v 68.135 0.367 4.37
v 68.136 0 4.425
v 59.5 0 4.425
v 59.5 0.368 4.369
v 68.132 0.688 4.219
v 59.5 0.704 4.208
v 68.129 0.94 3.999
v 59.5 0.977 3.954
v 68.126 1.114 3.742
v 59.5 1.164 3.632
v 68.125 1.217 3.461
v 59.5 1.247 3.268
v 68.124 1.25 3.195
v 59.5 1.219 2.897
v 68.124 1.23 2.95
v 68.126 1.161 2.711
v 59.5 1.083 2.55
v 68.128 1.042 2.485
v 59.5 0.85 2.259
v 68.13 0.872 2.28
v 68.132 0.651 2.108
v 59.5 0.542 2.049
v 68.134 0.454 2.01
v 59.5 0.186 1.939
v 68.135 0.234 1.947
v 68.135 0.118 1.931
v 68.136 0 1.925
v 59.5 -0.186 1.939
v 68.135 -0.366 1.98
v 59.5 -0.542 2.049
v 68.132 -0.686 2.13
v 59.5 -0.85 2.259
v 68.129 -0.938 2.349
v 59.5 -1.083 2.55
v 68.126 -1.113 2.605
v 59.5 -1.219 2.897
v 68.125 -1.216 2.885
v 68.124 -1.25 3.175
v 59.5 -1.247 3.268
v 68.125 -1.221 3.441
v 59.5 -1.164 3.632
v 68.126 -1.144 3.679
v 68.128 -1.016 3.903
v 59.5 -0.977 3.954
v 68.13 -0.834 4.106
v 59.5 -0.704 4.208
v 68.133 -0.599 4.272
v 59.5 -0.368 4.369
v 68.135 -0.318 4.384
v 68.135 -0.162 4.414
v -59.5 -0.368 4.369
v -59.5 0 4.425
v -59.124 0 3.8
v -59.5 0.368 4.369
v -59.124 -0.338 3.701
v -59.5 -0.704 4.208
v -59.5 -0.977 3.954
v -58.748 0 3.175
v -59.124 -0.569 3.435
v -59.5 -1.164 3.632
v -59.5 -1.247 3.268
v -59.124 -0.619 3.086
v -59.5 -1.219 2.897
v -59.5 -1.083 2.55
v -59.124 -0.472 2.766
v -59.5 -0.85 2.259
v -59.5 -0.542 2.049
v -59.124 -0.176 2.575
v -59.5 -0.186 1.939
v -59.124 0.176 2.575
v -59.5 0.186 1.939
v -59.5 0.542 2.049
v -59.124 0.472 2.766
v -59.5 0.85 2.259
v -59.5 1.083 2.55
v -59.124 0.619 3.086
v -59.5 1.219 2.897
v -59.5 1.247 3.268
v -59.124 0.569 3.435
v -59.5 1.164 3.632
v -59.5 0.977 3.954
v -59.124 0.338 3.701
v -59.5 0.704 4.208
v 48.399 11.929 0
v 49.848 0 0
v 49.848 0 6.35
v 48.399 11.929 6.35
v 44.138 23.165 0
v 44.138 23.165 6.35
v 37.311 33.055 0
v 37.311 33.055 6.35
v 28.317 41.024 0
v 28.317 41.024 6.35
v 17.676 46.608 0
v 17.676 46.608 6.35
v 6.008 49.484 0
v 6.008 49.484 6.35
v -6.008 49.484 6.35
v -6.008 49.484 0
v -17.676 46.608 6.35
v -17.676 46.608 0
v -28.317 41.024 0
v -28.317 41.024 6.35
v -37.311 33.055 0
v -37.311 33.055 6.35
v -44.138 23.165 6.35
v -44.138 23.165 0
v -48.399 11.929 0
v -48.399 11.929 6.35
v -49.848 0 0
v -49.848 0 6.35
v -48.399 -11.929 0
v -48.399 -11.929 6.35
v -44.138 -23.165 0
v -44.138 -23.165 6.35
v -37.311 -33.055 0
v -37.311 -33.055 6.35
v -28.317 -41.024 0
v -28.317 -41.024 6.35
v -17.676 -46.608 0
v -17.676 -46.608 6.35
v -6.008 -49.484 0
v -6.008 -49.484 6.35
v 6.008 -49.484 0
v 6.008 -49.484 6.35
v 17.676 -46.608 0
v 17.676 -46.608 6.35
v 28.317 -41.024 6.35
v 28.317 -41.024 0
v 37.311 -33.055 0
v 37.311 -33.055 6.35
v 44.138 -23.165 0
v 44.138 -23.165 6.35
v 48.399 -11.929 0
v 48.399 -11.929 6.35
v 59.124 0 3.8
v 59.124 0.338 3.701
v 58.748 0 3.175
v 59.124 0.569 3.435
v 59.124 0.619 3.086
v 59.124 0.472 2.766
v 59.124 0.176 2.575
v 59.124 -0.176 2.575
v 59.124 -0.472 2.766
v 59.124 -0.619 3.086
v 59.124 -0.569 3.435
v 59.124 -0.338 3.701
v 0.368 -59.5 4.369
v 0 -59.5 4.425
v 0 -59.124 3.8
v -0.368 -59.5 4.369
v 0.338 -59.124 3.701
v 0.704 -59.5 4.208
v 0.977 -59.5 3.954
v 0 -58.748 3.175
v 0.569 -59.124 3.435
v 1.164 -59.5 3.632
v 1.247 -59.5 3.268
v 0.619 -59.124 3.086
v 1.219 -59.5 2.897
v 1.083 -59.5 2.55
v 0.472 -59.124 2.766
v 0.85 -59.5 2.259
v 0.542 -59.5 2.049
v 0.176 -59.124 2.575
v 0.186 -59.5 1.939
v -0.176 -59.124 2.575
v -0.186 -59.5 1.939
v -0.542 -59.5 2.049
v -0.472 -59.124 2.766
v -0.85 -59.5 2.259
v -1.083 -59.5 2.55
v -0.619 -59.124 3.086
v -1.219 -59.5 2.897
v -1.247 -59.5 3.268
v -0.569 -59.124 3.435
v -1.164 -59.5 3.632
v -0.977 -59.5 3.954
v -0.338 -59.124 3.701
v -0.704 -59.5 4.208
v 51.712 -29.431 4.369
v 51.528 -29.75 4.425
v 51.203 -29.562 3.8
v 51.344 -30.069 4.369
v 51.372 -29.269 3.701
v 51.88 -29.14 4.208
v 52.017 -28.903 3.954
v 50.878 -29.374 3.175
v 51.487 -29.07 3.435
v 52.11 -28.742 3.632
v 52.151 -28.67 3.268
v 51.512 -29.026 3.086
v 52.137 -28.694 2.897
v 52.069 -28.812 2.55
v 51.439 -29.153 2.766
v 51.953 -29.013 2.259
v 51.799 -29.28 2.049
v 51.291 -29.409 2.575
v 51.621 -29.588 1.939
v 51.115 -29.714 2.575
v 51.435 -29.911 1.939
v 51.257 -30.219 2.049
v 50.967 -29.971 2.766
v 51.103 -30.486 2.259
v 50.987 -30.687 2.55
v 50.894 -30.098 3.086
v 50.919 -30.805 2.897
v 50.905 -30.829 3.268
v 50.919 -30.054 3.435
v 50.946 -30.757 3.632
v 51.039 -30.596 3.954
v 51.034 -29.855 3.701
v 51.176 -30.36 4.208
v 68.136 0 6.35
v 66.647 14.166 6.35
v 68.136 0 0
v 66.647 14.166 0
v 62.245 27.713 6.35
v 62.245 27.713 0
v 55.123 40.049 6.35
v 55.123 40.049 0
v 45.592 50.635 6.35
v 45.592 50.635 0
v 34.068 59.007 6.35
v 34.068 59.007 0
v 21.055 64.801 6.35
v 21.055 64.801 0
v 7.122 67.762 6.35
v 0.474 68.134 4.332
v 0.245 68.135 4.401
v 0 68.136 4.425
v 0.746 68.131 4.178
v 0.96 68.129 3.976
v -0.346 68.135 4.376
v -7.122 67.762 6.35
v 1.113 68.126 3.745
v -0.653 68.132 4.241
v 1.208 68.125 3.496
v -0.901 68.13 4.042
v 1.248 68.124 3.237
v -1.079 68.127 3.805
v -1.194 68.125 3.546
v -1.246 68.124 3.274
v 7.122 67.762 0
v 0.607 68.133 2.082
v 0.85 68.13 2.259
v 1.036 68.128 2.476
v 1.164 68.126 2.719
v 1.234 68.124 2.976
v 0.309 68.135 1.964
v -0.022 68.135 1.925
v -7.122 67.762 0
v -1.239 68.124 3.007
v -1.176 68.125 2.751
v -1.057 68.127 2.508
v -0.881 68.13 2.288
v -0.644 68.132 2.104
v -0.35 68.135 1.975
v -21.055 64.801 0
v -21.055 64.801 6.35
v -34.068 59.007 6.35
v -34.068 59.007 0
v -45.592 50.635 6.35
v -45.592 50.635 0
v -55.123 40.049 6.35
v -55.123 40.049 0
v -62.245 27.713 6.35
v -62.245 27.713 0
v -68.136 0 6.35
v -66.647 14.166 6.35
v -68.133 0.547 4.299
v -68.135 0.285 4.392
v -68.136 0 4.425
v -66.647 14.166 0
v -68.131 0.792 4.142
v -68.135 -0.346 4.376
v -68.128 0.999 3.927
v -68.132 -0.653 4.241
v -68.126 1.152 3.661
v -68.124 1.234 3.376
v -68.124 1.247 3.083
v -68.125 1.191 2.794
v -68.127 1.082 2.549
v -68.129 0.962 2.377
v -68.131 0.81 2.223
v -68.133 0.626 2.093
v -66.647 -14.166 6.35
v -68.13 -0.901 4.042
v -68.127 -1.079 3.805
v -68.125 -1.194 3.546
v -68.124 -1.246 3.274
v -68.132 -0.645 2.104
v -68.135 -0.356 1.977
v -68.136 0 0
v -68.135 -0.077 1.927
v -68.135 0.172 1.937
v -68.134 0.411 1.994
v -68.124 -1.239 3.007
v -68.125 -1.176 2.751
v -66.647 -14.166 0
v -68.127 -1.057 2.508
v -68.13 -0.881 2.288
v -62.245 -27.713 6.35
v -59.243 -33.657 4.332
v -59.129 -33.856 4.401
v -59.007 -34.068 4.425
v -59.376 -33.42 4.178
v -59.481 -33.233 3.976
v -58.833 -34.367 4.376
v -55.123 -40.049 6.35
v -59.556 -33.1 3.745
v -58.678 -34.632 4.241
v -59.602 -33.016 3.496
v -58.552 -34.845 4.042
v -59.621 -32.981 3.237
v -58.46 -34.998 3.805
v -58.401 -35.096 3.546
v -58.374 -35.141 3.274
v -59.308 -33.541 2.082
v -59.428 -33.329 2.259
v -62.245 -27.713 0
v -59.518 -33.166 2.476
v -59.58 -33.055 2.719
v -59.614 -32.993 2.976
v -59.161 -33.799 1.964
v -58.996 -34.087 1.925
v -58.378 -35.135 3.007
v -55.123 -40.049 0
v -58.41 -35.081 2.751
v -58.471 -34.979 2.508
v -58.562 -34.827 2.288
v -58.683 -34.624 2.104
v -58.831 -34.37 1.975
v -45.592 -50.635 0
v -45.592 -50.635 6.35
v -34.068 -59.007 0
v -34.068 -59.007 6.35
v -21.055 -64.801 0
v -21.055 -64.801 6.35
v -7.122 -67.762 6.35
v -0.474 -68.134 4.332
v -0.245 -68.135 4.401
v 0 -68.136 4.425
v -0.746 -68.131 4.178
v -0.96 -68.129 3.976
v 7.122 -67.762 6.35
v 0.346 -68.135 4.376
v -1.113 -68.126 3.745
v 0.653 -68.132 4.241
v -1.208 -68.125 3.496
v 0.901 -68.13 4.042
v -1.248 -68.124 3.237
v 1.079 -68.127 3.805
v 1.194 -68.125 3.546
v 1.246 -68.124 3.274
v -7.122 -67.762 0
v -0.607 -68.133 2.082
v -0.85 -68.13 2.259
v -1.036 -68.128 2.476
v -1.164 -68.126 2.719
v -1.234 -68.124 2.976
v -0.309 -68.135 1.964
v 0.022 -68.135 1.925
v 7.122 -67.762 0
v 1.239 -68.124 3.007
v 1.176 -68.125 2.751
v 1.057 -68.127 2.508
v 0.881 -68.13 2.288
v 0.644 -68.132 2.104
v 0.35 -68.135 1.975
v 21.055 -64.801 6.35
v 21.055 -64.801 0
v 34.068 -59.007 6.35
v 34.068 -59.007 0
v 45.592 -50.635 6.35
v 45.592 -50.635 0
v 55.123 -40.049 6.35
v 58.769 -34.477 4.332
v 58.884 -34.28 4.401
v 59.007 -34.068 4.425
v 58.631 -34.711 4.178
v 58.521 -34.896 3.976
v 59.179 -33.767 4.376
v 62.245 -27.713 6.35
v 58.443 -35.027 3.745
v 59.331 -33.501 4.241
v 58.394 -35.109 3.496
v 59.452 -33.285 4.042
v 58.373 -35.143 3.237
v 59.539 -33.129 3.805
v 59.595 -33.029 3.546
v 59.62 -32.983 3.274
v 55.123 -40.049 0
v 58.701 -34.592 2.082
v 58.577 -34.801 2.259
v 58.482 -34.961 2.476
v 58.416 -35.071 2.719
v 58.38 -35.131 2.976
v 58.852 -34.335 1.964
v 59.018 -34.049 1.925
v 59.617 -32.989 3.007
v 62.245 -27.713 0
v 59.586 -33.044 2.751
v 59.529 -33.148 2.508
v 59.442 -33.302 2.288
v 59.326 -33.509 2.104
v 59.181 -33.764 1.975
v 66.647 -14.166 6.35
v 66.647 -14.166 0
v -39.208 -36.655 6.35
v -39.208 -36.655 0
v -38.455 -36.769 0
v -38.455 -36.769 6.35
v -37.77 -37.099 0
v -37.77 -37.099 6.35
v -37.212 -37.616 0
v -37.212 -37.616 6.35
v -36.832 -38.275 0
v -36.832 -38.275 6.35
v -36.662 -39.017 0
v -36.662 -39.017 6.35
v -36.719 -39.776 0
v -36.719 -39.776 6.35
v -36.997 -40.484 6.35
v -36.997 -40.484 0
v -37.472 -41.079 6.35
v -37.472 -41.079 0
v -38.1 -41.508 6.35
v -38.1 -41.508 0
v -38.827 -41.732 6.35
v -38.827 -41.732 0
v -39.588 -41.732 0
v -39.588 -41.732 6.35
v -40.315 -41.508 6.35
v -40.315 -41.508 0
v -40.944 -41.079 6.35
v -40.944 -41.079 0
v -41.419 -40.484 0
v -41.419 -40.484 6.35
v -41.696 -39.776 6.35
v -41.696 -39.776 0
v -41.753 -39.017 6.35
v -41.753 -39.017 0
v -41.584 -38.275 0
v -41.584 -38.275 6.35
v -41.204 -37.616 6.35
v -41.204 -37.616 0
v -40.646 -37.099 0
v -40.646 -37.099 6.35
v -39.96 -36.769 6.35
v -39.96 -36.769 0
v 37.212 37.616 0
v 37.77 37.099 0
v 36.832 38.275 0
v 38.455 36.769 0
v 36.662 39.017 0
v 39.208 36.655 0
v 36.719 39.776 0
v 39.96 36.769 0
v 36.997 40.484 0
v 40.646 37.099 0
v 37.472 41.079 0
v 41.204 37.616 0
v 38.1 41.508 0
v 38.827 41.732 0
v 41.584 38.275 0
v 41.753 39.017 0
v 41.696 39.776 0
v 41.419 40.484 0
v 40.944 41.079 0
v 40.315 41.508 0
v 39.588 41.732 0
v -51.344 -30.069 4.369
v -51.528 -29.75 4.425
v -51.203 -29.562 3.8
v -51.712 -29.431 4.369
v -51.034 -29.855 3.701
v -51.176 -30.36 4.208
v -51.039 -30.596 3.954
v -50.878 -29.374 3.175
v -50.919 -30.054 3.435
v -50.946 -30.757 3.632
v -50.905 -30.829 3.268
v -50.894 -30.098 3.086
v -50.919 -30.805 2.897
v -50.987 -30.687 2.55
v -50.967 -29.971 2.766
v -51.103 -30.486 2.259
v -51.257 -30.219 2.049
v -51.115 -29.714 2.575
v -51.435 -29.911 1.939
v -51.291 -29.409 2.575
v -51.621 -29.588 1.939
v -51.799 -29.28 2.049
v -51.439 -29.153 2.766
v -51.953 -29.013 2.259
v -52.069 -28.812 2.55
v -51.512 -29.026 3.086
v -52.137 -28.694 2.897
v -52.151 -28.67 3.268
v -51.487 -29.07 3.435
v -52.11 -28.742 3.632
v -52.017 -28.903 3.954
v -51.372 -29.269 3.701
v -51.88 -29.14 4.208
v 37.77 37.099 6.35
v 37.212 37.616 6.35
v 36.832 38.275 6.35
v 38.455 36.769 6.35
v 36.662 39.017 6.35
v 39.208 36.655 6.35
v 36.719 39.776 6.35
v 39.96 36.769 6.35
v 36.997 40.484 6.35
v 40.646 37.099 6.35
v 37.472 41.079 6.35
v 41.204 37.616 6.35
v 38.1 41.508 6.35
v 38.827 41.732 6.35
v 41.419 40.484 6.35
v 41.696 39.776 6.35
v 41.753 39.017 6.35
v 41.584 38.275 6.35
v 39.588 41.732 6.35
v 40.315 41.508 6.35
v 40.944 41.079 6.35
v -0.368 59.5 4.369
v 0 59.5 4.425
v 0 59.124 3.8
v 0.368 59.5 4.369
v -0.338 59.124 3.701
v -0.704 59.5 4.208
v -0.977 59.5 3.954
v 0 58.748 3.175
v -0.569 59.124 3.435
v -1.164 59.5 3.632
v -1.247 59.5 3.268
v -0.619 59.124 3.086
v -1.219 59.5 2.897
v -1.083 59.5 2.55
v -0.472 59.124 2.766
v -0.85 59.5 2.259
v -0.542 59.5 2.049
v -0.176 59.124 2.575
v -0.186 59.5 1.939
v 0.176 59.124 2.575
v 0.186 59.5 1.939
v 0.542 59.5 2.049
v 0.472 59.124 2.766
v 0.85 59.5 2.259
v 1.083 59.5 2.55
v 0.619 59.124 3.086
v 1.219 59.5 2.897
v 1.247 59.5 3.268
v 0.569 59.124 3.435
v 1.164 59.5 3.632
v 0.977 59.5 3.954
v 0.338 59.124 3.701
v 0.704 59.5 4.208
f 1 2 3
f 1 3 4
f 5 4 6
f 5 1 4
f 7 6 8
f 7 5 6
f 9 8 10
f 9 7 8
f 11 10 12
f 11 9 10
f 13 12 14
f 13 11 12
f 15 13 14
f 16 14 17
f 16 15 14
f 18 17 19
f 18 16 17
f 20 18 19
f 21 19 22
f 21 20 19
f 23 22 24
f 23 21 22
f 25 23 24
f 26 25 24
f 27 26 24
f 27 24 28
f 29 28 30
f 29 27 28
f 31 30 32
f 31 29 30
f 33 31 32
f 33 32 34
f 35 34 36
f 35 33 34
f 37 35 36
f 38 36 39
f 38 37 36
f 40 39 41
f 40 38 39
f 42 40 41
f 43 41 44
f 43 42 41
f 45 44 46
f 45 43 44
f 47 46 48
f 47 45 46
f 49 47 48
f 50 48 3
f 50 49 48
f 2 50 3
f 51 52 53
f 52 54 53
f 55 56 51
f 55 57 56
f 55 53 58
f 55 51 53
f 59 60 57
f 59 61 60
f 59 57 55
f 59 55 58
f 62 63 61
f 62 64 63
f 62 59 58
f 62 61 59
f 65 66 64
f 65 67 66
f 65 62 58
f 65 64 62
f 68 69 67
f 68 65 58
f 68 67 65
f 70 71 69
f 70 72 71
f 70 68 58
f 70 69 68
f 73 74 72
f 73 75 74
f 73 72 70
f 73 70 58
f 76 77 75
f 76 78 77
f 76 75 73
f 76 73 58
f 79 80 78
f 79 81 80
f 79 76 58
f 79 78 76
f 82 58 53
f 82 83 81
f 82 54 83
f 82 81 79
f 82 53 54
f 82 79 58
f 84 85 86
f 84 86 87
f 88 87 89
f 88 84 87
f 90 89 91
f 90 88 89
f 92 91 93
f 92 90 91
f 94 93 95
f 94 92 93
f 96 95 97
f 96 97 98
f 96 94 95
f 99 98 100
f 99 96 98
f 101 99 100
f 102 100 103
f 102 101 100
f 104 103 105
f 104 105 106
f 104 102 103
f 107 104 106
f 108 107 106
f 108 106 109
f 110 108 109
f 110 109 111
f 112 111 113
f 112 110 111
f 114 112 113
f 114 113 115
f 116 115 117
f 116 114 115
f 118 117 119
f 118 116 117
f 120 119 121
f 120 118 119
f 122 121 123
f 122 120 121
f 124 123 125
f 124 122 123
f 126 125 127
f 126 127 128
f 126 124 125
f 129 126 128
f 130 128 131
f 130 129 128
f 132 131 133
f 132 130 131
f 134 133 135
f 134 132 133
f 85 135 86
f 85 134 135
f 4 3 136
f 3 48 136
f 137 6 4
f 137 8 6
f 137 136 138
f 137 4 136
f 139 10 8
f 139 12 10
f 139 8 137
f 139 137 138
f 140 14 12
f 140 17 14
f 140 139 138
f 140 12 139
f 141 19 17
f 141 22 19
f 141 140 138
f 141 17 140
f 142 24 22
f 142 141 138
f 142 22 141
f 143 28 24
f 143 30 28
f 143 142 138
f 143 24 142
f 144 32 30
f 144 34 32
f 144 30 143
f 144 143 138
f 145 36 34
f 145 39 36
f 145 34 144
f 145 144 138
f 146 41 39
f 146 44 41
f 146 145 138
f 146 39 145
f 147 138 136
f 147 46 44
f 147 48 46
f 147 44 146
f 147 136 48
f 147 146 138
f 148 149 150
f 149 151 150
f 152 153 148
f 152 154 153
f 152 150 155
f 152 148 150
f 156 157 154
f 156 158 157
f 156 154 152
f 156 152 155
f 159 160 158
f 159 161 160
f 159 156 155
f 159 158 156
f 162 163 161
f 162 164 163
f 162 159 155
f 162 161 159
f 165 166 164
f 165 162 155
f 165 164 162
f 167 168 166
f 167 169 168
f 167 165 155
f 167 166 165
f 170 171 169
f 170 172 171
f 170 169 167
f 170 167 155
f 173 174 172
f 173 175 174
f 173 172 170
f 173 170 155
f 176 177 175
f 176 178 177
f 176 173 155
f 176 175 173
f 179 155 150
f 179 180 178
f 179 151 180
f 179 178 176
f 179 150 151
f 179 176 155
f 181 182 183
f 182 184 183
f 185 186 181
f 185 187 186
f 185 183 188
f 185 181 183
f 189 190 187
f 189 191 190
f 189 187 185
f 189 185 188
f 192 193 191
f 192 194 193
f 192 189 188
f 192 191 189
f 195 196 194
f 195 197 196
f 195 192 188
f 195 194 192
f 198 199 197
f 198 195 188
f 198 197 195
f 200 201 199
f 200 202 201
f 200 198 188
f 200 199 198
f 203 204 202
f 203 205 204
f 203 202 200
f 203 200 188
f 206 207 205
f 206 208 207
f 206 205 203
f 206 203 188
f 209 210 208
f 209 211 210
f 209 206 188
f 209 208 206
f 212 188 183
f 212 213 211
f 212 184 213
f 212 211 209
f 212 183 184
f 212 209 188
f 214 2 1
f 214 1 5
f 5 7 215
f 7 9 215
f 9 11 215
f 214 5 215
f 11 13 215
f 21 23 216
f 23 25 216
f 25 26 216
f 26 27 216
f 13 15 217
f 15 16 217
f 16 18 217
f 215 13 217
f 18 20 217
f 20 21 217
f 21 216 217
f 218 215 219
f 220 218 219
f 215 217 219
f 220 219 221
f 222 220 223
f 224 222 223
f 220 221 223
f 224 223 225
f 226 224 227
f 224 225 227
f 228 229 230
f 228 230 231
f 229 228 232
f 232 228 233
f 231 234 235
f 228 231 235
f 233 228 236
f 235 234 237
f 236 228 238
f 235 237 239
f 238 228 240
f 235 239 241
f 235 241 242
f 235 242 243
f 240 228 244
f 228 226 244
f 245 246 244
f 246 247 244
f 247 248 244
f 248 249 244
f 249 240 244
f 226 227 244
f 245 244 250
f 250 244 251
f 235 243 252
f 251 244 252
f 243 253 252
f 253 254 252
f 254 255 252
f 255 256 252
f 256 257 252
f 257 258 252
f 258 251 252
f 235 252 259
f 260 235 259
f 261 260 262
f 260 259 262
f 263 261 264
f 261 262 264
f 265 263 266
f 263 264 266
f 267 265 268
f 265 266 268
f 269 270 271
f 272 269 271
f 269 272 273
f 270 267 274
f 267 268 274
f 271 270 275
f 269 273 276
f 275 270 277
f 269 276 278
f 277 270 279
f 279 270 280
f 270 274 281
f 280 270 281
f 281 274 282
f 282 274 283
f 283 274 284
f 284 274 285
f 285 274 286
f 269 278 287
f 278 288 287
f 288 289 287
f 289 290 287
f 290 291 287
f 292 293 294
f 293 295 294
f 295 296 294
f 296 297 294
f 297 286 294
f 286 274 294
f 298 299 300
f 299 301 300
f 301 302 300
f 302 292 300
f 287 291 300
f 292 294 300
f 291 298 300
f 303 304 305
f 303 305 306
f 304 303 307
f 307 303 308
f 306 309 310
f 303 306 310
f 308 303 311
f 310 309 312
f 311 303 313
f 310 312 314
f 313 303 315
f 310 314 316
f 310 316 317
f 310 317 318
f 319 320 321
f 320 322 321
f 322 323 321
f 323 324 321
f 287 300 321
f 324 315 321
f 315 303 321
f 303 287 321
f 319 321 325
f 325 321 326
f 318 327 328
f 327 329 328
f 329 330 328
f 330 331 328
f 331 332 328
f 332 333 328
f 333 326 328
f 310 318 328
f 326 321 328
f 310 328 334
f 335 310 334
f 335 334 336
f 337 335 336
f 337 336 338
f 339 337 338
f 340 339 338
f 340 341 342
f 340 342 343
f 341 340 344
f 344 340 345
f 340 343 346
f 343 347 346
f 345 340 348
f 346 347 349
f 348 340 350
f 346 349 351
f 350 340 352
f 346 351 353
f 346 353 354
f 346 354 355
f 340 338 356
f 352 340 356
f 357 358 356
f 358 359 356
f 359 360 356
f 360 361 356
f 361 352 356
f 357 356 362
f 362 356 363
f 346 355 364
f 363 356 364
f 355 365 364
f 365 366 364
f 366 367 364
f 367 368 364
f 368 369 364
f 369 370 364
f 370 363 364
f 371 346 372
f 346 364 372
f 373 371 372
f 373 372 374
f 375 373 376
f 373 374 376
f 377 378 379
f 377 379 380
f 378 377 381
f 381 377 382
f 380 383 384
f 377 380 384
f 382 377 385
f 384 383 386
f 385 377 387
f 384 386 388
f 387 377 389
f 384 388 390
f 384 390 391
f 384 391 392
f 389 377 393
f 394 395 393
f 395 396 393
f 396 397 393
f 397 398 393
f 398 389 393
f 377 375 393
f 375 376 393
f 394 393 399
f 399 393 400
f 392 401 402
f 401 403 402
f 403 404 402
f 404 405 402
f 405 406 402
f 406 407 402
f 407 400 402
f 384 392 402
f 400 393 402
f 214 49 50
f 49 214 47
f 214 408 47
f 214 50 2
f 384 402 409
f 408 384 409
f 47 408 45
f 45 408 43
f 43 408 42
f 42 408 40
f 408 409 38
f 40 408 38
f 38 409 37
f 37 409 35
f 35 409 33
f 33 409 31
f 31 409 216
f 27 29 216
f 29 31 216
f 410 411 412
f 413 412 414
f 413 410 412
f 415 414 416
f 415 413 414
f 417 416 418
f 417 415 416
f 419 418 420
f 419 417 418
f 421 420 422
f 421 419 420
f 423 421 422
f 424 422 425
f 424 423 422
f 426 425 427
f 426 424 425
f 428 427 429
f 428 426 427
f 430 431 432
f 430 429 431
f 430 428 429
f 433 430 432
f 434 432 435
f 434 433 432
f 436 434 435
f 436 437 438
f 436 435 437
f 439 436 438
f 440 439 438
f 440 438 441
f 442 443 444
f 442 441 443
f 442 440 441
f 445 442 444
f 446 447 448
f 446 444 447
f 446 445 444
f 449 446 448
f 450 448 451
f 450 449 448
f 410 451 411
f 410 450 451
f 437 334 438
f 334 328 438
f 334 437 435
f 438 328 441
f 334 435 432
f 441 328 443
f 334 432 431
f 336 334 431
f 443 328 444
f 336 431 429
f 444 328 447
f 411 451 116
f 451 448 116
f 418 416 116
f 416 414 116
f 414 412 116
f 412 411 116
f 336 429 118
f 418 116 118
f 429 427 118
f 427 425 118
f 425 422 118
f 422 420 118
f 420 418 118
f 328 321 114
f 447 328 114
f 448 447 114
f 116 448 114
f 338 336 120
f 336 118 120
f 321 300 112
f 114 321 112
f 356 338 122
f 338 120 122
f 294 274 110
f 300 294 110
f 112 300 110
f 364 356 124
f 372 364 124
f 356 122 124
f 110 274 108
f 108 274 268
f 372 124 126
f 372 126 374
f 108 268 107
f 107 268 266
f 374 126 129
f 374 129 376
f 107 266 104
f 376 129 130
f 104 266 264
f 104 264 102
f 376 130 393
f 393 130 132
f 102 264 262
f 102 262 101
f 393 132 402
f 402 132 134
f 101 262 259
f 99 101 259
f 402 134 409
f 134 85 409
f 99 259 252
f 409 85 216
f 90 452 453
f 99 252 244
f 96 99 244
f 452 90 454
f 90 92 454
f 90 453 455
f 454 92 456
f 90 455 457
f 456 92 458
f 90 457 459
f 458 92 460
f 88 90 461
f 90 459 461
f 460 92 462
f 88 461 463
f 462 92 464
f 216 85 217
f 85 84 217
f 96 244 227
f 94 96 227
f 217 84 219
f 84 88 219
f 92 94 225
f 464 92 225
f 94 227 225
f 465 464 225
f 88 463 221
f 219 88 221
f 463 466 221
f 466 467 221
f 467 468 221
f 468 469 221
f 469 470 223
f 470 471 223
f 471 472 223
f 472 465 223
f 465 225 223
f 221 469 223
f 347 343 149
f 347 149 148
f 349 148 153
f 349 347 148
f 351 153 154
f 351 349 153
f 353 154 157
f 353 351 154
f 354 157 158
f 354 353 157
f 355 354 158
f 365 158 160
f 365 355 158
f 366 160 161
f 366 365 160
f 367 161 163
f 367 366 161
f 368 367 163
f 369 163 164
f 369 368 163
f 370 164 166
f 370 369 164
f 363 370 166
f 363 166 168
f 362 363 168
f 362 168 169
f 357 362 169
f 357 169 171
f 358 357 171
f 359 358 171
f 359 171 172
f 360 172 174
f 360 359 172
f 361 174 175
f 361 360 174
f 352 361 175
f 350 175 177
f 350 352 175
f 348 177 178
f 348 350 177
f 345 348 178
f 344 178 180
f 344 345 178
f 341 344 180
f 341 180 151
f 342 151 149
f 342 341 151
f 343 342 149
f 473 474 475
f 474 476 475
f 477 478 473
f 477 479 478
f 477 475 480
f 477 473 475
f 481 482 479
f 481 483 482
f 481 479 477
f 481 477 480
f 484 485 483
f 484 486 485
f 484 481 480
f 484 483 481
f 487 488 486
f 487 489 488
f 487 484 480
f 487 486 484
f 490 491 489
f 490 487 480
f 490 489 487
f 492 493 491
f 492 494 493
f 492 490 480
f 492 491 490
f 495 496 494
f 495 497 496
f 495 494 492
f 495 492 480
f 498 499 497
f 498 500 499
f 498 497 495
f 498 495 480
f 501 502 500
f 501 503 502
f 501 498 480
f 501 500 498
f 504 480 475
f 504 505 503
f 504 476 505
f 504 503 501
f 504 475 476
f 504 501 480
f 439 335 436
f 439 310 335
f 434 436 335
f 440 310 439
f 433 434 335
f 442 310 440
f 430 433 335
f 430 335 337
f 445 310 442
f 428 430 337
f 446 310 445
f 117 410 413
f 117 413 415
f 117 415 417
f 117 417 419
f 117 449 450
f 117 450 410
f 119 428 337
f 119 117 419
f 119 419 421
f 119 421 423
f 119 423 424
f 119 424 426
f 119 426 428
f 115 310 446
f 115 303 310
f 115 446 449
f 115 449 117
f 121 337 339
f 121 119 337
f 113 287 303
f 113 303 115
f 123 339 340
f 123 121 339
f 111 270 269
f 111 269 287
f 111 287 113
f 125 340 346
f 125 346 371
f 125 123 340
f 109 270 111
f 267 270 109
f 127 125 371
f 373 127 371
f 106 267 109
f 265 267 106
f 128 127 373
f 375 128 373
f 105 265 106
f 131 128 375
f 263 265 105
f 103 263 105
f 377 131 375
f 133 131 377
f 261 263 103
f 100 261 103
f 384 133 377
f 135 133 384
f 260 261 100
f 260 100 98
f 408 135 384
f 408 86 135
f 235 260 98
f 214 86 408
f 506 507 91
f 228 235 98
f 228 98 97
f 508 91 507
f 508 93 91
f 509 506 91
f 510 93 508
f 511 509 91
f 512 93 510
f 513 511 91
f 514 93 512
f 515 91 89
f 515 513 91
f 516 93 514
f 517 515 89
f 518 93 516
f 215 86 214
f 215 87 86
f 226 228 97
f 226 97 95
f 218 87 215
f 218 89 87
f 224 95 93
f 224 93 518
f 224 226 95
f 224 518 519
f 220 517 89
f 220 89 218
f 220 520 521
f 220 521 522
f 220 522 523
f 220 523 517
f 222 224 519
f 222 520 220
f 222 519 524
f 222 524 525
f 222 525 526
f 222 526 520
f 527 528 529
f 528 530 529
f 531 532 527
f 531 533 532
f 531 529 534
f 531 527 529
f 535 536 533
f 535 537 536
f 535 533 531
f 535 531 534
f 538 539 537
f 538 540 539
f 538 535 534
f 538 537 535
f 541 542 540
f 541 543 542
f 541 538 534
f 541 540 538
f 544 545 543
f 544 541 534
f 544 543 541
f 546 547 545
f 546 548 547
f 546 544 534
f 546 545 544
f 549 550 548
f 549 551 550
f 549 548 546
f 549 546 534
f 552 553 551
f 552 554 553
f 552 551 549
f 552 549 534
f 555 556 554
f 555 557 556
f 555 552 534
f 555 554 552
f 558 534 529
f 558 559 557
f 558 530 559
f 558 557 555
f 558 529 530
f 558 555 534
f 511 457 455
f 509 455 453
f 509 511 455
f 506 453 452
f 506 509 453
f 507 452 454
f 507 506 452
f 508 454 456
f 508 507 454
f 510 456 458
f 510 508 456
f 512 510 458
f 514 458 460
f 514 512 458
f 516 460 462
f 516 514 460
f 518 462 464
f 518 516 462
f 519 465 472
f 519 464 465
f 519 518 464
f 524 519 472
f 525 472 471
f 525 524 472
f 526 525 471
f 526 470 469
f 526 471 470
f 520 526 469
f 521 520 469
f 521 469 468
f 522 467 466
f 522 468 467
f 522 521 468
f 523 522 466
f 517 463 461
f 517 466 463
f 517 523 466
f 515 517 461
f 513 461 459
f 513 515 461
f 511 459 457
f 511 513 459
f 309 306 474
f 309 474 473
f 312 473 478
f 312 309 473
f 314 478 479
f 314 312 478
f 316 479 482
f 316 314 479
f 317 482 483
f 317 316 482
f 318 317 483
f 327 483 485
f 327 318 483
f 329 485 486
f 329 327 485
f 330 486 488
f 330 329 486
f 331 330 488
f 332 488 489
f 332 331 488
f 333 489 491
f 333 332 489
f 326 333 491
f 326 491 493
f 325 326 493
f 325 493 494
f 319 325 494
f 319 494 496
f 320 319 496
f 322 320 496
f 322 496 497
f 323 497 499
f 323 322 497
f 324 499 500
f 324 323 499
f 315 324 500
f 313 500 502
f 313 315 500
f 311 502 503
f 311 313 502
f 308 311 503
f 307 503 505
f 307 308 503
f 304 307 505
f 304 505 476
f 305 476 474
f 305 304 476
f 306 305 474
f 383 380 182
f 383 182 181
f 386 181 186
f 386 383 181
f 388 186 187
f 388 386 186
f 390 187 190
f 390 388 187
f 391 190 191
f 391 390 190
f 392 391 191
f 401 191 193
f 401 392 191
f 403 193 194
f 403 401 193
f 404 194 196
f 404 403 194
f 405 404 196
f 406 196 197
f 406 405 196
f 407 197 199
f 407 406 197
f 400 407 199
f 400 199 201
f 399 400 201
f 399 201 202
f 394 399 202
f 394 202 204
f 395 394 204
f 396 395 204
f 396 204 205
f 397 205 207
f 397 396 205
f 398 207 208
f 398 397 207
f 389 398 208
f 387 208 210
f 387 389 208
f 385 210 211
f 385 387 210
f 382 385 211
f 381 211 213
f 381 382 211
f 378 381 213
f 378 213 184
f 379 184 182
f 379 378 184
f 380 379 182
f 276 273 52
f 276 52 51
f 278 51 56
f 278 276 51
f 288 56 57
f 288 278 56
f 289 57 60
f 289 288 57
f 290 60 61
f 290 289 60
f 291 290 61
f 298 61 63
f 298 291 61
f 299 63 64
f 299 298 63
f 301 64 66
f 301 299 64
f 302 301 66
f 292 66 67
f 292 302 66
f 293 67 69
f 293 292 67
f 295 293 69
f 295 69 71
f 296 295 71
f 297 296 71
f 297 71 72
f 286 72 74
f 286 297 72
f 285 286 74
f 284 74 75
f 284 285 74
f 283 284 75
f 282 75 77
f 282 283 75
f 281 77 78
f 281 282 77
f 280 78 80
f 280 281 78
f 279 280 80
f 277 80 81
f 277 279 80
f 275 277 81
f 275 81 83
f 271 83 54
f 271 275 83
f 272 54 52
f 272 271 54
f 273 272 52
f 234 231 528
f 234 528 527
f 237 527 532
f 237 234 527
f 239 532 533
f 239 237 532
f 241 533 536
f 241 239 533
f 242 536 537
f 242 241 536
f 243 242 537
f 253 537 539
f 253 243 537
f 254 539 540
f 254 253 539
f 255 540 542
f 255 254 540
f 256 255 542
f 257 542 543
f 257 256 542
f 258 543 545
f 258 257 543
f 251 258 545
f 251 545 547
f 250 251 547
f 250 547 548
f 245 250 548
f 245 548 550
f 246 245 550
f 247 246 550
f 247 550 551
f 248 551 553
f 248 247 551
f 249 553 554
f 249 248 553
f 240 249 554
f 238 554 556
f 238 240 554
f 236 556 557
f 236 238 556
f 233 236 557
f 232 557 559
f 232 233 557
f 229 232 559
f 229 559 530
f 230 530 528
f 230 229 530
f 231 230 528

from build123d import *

# Parameters (mm, degrees)
SKETCH1_R         = 68.1355
SKETCH1_R_2       = 49.8475
EXTRUDE1_DEPTH    = 6.35
CIRPATTERN1_COUNT = 4
CIRPATTERN3_COUNT = 3
CIRPATTERN2_COUNT = 2


with BuildPart() as part:
    # Sketch1 → Extrude1 (new body)
    with BuildSketch(Plane.XY):
        Circle(SKETCH1_R)
        Circle(SKETCH1_R_2, mode=Mode.SUBTRACT)
    extrude(amount=EXTRUDE1_DEPTH)

    # Sketch4 → M3x0.5 Tapped Hole1 (revolve, cut)
    with BuildSketch(Plane(origin=(0, 68.1355, 3.175), x_dir=(0, 0, 1), z_dir=(1, 0, 0))):
        Polygon((0, 0), (0, 9.387075774), (1.25, 8.636), (1.25, 0), align=None)
    m3x0_5_tapped_hole1 = revolve(axis=Axis((0, 74.4855, 3.175), (0, -1, 0)), mode=Mode.SUBTRACT)

    # CirPattern1: M3x0.5 Tapped Hole1 ×4 about axis
    cirpattern1_axis = Axis((0, 0, 6.35), (0, 0, -1))
    for i in range(1, CIRPATTERN1_COUNT):
        add(m3x0_5_tapped_hole1.rotate(cirpattern1_axis, i * 360 / CIRPATTERN1_COUNT), mode=Mode.SUBTRACT)

    # CirPattern3: M3x0.5 Tapped Hole1 ×3 about axis
    cirpattern3_axis = Axis((0, 0, 6.35), (0, 0, -1))
    for i in range(1, CIRPATTERN3_COUNT):
        add(m3x0_5_tapped_hole1.rotate(cirpattern3_axis, i * 360 / CIRPATTERN3_COUNT), mode=Mode.SUBTRACT)

    # Sketch18 → 1/4-20 Tapped Hole1 (revolve, cut)
    with BuildSketch(Plane(origin=(39.207798225, 39.207798225, 6.35), x_dir=(0, -1, 0), z_dir=(1, 0, 0))):
        Polygon((0, 0), (0, 20.583816902), (2.5527, 19.05), (2.5527, 0), align=None)
    f_1_4_20_tapped_hole1 = revolve(axis=Axis((39.207798225, 39.207798225, 12.7), (0, 0, -1)), mode=Mode.SUBTRACT)

    # CirPattern2: 1/4-20 Tapped Hole1 ×2 about axis
    cirpattern2_axis = Axis((0, 0, 0), (0, 0, 1))
    for i in range(1, CIRPATTERN2_COUNT):
        add(f_1_4_20_tapped_hole1.rotate(cirpattern2_axis, i * 360 / CIRPATTERN2_COUNT), mode=Mode.SUBTRACT)


solid = part.part
